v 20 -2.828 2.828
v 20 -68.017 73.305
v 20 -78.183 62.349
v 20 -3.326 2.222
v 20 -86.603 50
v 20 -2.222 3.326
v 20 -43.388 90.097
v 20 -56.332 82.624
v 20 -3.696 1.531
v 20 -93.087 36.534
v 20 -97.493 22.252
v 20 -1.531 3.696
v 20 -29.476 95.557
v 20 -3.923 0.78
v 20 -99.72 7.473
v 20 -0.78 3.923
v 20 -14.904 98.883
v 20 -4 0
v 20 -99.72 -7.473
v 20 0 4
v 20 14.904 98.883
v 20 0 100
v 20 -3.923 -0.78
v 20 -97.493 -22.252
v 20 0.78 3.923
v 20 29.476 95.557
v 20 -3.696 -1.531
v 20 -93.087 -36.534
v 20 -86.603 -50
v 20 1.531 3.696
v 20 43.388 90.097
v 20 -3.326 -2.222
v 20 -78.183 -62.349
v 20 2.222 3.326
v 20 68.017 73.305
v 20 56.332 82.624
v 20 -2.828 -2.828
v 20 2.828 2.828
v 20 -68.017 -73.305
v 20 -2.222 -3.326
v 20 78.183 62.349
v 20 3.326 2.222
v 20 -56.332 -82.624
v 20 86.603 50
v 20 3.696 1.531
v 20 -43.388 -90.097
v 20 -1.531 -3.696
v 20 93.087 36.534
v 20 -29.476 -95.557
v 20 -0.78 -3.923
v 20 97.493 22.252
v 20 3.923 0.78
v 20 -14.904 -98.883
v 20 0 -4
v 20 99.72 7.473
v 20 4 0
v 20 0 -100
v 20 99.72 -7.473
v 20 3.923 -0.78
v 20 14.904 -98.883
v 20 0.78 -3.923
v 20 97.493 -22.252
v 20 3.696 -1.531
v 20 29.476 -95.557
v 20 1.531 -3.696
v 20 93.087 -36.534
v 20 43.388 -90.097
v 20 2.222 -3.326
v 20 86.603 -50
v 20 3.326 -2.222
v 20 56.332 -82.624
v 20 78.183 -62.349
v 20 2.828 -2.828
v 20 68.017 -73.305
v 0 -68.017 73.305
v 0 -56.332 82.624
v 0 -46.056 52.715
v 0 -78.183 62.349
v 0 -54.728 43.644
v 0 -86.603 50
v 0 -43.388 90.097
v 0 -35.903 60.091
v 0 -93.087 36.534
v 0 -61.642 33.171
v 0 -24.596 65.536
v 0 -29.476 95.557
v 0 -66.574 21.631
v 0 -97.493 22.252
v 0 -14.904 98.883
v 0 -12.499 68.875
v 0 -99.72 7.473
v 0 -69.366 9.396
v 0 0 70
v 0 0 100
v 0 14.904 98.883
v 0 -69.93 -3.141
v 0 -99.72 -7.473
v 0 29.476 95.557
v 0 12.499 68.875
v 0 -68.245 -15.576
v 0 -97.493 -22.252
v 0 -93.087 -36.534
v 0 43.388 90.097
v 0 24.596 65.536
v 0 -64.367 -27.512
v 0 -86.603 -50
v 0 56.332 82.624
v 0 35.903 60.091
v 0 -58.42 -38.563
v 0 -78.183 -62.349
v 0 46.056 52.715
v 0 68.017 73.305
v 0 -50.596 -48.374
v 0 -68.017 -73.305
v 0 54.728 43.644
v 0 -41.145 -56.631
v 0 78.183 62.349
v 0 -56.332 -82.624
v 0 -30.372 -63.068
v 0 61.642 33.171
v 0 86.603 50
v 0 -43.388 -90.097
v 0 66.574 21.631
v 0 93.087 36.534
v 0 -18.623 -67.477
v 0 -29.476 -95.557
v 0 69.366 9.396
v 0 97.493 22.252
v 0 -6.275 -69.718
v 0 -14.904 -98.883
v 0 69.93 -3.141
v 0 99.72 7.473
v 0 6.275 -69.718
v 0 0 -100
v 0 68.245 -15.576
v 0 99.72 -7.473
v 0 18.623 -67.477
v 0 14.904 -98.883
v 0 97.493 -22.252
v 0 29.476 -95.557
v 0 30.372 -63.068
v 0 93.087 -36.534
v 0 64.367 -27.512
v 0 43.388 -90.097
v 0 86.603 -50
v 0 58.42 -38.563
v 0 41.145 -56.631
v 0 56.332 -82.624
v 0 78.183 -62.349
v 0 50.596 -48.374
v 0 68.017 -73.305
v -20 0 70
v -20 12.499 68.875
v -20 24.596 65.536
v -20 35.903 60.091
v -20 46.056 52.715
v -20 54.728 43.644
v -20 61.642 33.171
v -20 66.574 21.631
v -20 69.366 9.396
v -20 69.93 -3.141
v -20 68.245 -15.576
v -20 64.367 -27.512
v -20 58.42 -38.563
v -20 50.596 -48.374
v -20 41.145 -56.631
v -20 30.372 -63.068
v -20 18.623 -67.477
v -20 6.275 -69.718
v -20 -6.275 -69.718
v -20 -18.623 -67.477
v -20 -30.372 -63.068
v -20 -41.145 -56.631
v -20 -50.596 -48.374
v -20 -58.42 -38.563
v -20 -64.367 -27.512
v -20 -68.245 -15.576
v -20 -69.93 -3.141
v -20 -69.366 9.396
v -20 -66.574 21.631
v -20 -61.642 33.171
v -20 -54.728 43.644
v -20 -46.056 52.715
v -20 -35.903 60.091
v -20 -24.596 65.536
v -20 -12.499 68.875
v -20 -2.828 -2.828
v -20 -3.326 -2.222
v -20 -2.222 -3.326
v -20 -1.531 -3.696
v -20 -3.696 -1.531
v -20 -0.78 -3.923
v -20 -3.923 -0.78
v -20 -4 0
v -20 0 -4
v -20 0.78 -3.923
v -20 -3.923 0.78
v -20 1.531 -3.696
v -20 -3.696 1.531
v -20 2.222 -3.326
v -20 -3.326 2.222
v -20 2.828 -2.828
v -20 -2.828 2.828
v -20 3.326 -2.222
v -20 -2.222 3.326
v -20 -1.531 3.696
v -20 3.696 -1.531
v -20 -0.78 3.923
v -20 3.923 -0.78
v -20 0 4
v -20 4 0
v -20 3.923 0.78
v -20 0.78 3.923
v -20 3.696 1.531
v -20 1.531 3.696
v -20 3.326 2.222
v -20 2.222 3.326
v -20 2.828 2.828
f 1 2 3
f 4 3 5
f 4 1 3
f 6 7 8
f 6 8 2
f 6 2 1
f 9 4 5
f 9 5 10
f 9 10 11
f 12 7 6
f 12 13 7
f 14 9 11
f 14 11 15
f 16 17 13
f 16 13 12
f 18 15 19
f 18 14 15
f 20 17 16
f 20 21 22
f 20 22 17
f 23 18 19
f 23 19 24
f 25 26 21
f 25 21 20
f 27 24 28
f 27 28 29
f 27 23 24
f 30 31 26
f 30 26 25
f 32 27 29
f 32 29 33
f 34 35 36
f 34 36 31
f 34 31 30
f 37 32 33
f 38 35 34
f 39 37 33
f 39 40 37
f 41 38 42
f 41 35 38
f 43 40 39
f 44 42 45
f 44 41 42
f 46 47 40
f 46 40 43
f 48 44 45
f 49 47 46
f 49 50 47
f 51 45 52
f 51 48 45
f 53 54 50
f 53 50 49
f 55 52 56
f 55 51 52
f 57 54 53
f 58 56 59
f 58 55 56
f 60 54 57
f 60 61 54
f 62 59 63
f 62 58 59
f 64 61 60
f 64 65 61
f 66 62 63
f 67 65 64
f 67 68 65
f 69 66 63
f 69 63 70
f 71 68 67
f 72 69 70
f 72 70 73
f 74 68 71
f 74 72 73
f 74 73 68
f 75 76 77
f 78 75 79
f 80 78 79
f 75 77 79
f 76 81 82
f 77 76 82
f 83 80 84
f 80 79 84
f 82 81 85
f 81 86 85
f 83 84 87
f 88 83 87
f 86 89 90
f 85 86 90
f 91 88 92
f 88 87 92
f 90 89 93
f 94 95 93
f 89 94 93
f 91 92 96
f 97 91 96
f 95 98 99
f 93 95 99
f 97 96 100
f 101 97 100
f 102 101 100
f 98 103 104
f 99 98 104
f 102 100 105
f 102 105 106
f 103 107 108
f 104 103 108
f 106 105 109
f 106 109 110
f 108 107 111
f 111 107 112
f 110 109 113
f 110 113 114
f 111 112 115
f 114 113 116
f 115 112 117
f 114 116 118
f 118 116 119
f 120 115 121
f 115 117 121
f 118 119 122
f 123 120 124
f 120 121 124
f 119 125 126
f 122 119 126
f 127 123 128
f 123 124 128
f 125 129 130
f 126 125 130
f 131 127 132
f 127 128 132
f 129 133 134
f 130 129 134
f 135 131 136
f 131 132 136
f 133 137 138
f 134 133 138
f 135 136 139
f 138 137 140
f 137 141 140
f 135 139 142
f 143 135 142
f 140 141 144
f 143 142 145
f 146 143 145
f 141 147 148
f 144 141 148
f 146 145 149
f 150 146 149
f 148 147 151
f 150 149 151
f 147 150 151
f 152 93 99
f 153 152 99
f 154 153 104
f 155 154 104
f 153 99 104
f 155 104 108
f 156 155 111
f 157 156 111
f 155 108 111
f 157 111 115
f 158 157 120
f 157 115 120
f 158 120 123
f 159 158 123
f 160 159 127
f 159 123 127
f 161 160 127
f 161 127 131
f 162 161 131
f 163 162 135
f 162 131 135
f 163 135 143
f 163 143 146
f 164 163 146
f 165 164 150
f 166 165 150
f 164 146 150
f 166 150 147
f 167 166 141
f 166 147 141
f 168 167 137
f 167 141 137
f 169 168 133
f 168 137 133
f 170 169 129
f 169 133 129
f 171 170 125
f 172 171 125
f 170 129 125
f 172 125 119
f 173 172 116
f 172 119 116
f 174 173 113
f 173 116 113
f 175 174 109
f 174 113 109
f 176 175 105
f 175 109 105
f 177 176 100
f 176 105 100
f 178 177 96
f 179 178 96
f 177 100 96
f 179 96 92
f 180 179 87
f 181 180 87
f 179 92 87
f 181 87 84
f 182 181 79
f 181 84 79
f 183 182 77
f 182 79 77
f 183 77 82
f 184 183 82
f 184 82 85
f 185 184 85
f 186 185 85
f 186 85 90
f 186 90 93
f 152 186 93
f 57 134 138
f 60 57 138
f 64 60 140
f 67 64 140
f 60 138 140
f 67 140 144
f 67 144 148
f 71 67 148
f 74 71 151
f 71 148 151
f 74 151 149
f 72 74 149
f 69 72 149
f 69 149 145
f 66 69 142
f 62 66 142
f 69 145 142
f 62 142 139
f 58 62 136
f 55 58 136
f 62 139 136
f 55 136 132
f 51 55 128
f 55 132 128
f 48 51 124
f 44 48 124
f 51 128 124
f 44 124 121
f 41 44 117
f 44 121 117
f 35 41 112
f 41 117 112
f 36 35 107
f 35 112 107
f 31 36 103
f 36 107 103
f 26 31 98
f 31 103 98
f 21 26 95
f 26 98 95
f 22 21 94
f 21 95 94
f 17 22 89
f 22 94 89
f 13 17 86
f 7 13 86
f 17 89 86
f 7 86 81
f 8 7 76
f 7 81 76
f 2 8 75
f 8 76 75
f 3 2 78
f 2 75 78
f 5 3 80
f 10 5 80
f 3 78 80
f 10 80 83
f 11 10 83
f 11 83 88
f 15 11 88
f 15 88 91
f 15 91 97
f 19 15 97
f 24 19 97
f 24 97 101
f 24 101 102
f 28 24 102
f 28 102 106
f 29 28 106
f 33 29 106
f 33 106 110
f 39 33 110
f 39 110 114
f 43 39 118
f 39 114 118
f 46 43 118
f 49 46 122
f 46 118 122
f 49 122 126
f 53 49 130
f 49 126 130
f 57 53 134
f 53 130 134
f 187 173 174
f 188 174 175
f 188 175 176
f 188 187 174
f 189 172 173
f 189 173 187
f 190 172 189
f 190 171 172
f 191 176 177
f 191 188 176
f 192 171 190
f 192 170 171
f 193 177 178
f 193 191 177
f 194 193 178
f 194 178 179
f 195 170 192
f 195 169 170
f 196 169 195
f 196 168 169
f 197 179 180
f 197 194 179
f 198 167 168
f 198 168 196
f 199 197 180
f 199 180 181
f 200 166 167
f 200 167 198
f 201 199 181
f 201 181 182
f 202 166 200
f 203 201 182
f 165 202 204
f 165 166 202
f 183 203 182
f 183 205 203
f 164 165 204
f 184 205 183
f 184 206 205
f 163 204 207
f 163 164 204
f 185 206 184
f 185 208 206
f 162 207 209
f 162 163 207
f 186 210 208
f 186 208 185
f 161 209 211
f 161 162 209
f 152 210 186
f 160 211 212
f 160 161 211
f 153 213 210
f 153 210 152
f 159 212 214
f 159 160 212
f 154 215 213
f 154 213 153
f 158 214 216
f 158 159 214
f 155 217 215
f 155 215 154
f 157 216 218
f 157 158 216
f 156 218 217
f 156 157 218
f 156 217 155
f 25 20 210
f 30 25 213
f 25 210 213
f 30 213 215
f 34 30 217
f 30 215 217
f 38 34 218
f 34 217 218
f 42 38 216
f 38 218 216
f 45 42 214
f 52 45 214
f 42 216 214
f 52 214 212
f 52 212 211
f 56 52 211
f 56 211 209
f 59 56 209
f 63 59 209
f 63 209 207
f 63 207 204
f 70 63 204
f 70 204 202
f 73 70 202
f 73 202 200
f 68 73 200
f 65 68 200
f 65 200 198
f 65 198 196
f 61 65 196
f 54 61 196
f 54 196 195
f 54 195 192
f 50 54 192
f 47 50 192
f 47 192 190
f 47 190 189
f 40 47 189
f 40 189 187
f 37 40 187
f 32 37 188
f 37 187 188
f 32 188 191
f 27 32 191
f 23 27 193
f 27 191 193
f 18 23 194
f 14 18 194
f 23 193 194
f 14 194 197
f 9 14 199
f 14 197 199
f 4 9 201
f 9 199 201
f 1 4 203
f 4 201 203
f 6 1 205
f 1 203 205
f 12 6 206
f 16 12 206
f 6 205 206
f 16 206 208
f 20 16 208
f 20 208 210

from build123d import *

# Parameters (mm, degrees)
SKETCH1_R           = 100
BOSS_EXTRUDE1_DEPTH = 20
SKETCH2_R           = 70
BOSS_EXTRUDE2_DEPTH = 20
CUT_EXTRUDE1_REACH  = 148.969
SKETCH3_R           = 4


with BuildPart() as part:
    # Sketch1 → Boss-Extrude1 (new body)
    with BuildSketch(Plane(origin=(0, 0, 0), x_dir=(0, 0, -1), z_dir=(1, 0, 0))):
        Circle(SKETCH1_R)
    extrude(amount=BOSS_EXTRUDE1_DEPTH)

    # Sketch2 → Boss-Extrude2 (add)
    with BuildSketch(Plane.ZY):
        Circle(SKETCH2_R)
    extrude(amount=BOSS_EXTRUDE2_DEPTH)

    # Sketch3 → Cut-Extrude1 (cut, up to next)
    with BuildSketch(Plane.ZY.offset(20), mode=Mode.PRIVATE) as cut_extrude1_sk1:
        Circle(SKETCH3_R)
    cut_extrude1_tool1 = extrude(cut_extrude1_sk1.sketch, amount=-CUT_EXTRUDE1_REACH, mode=Mode.PRIVATE) & part.part
    add(cut_extrude1_tool1.solids().sort_by_distance((-20, 0, 0))[0], mode=Mode.SUBTRACT)


solid = part.part
